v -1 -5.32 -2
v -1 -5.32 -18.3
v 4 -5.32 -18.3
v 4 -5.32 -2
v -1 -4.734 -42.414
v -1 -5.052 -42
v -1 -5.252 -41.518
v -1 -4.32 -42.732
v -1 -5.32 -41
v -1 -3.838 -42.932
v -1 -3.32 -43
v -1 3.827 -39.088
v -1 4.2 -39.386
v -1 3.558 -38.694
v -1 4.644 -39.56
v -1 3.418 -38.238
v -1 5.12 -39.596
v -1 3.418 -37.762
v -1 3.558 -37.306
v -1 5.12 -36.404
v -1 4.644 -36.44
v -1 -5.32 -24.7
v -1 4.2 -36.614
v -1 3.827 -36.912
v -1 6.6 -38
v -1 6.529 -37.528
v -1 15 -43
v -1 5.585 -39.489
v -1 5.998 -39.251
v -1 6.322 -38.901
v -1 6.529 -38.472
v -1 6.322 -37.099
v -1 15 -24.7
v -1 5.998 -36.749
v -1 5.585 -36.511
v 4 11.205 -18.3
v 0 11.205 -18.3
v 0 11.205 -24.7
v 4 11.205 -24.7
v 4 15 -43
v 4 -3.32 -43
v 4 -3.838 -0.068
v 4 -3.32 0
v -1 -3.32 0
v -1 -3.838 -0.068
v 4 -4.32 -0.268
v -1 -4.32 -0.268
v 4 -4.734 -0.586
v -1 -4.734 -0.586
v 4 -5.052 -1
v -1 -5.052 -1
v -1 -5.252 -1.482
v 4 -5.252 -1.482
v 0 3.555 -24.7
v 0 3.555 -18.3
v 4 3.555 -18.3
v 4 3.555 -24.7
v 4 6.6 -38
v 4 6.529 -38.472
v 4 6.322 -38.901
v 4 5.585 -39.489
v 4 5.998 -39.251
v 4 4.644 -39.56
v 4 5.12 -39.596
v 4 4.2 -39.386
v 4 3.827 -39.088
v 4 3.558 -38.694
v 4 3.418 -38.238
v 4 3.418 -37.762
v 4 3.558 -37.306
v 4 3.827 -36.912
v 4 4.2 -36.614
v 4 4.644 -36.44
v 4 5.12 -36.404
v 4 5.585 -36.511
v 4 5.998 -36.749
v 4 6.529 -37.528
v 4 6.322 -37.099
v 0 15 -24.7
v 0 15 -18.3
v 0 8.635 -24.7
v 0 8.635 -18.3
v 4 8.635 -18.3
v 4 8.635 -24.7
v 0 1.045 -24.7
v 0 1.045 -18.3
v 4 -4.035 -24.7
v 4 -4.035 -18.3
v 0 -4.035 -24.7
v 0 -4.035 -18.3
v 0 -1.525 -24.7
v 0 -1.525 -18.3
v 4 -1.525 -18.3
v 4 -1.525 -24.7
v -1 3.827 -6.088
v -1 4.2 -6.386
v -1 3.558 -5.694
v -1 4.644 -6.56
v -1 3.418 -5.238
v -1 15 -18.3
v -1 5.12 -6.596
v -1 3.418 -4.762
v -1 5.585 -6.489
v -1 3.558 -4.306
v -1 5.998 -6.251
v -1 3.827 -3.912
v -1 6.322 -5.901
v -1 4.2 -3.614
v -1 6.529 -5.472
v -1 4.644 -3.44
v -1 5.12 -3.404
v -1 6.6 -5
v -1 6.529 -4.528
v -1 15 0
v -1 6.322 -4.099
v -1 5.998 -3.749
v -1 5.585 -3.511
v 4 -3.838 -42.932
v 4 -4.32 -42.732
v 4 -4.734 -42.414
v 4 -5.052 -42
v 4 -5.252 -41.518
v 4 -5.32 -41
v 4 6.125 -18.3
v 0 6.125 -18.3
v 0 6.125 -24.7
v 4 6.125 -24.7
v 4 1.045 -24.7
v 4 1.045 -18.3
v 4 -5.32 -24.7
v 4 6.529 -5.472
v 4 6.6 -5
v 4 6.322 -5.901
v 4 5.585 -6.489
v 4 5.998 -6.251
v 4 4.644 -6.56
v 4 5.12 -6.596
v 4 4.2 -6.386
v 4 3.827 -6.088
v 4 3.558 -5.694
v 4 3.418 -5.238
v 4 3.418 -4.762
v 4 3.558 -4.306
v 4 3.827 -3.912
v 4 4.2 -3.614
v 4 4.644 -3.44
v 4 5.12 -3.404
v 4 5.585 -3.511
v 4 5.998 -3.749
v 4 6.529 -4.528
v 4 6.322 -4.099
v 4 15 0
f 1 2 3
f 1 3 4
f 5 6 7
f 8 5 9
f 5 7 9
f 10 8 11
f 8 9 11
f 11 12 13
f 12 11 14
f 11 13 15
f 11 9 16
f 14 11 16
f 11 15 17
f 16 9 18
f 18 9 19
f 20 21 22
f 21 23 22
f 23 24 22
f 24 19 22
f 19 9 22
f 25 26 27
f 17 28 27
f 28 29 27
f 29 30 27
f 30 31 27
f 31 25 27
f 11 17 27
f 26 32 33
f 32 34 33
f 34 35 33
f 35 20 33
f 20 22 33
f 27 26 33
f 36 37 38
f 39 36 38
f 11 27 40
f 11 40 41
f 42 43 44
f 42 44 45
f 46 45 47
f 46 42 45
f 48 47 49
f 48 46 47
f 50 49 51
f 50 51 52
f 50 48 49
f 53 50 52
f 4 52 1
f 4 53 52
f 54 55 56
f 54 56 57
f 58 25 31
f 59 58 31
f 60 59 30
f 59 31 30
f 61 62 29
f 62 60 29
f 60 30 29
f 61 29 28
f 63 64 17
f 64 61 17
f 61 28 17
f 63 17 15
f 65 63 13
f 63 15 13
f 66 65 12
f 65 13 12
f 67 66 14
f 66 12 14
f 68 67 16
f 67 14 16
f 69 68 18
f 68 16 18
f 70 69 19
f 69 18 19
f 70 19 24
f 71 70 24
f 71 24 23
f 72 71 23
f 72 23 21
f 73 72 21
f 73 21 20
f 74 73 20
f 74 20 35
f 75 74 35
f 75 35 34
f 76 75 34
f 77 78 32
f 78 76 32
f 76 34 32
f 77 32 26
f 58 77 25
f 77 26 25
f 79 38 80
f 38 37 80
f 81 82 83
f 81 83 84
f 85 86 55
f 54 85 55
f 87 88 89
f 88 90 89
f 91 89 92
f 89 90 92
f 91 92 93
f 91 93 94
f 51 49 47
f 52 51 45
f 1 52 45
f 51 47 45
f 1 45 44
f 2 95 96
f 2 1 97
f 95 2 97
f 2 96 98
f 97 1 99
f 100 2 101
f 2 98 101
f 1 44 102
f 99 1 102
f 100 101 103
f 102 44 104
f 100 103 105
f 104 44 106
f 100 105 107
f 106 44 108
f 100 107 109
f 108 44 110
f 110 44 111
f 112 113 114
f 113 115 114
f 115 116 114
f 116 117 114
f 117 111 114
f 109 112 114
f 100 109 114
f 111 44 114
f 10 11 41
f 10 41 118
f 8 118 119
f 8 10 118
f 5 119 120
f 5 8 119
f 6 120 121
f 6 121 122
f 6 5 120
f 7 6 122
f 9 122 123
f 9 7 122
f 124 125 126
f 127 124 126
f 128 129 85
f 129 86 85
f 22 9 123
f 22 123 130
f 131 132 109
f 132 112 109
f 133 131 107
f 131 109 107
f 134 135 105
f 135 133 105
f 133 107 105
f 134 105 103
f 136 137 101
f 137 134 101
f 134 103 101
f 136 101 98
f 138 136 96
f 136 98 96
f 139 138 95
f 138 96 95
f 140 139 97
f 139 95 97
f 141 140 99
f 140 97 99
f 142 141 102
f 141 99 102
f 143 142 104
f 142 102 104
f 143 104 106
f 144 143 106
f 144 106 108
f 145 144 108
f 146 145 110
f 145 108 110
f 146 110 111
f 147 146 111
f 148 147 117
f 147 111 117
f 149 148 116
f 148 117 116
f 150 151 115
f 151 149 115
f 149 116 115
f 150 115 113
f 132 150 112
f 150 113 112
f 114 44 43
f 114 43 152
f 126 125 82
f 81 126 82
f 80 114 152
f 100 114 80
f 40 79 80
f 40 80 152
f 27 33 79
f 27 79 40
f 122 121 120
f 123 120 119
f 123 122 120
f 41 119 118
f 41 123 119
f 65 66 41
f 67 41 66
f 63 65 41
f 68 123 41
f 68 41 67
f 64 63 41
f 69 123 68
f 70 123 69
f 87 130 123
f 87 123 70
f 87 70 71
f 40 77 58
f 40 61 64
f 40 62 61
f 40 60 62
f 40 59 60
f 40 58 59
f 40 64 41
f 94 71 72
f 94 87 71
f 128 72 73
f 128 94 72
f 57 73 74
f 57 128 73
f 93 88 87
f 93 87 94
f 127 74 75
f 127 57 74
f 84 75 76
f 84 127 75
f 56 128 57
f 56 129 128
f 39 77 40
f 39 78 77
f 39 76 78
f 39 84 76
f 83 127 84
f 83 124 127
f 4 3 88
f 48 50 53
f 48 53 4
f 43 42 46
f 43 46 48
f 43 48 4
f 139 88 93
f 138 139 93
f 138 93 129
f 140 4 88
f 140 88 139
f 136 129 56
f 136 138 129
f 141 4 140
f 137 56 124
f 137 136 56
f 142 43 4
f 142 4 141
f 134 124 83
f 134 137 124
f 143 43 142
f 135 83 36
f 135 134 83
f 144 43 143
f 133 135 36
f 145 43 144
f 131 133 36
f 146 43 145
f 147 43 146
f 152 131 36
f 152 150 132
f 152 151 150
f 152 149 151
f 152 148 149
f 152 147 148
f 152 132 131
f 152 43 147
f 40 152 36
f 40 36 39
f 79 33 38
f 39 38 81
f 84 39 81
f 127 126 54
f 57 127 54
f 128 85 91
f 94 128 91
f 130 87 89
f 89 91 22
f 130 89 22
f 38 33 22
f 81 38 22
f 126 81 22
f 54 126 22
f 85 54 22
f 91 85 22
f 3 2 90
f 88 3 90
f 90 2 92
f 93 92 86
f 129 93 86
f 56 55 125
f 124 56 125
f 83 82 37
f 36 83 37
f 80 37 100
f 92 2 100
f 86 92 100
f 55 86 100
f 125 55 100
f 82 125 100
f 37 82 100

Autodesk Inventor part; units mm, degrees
ref_plane "YZ Plane" through (0, 0, 0) normal (1, 0, 0) x (0, 1, 0)
ref_plane "XZ Plane" through (0, 0, 0) normal (0, 1, 0) x (-1, 0, 0)
ref_plane "XY Plane" through (0, 0, 0) normal (0, 0, 1) x (1, 0, 0)
sketch "スケッチ1" plane through (0, 0, 0) normal (1, 0, 0) x (0, 1, 0)
  line L0 (0, 0) -> (30, 0)
  line L1 (30, 0) -> (30, -43)
  line L2 (30, -43) -> (0, -43)
  line L3 (0, -43) -> (0, 0)
  circle A0 centre (15, -5) radius 1.5
  circle A1 centre (15, -38) radius 1.5
  line L4 (30, -21.5) -> (0, -21.5)
  line L5 (30, -18.3) -> (0, -18.3)
  line L6 (30, -24.7) -> (0, -24.7)
  line L7 (15, 0) -> (15, -43)
  line L8 (16.285, -18.3) -> (16.285, -24.7)
  line L9 (13.715, -18.3) -> (13.715, -24.7)
  line L10 (20.08, -18.3) -> (20.08, -24.7)
  line L11 (25.16, -18.3) -> (25.16, -24.7)
  line L12 (30.24, -18.3) -> (30.24, -24.7)
  line L13 (21.365, -18.3) -> (21.365, -24.7)
  line L14 (26.445, -18.3) -> (26.445, -24.7)
  line L15 (28.955, -18.3) -> (28.955, -24.7)
  line L16 (23.875, -18.3) -> (23.875, -24.7)
  line L17 (18.795, -18.3) -> (18.795, -24.7)
  line L18 (8.635, -18.3) -> (8.635, -24.7)
  line L19 (3.555, -18.3) -> (3.555, -24.7)
  line L20 (1.045, -18.3) -> (1.045, -24.7)
  line L21 (6.125, -18.3) -> (6.125, -24.7)
  line L22 (11.205, -18.3) -> (11.205, -24.7)
  circle A2 centre (5, -5) radius 1.6
  circle A3 centre (22.5, -5) radius 1.7
  circle A4 centre (22.5, -38) radius 1.7
  circle A5 centre (5, -38) radius 1.6
  line L23 (1.045, -18.3) -> (1.045, -24.7)
  line L24 (-1.525, -18.3) -> (-1.525, -24.7)
  line L25 (-4.035, -18.3) -> (-4.035, -24.7)
  line L26 (-6.605, -18.3) -> (-6.605, -24.7)
  line L27 (-6.605, -18.3) -> (-4.035, -18.3)
  line L28 (-5.32, -18.3) -> (-5.32, 0.2949)
  line L29 (-5.32, 0) -> (0, 0)
  line L30 (0, 0) -> (0, -43)
  line L31 (0, -43) -> (-5.32, -43)
  line L32 (-5.32, -43) -> (-5.32, 0)
  line L33 (0, -18.3) -> (-5.32, -18.3)
  line L34 (0, -24.7) -> (-5.32, -24.7)
  point P0 (15, -24.7)
  point P1 (15, -18.3)
  dimension "d0" = 30
  dimension "d1" = 43
  dimension "d2" = 3
  dimension "d3" = 3
  dimension "d4" = 5
  dimension "d5" = 5
  dimension "d6" = 15
  dimension "d7" = 15
  dimension "d8" = 3.2
  dimension "d9" = 3.2
  dimension "d10" = 1.285
  dimension "d11" = 1.285
  dimension "d12" = 5.08
  dimension "d13" = 5.08
  dimension "d14" = 5.08
  dimension "d15" = 1.285
  dimension "d16" = 1.285
  dimension "d17" = 1.285
  dimension "d21" = 3.2
  dimension "d22" = 3.4
  dimension "d23" = 3.4
  dimension "d24" = 3.2
  dimension "d25" = 5
  dimension "d26" = 5
  dimension "d28" = 7.5
  dimension "d30" = 5
  dimension "d31" = 7.5
  dimension "d32" = 5
  dimension "d38" = 5.08
  dimension "d43" = 0
  dimension "d44" = 10
  dimension "d45" = 10
extrude "押し出し1" add sketch "スケッチ1" along normal blind 4 contours L0 L7 A0 L5 L3 | L3 L33 L27 L28 L29 | L7 A0 | L5 L19 L4 L20 | L24 L34 L25 L33 | L6 L7 A1 L2 L3 | L3 L31 L32 L34 | L4 L19 L6 L20 | L7 L4 L9 L5 | L5 L18 L4 L21 | L9 L4 L22 L5 | L7 L6 L9 L4 | L4 L18 L6 L21 | L9 L6 L22 L4 | A1 L7 picked at (14.3164, -4.583) picked at (14.3492, -38.284)
sketch "スケッチ2" plane through (4, 0, 0) normal (1, 0, 0) x (0, 0, -1)
  line L0 (18.3, 1.045) -> (24.7, 1.045) projected
  line L1 (18.3, 3.555) -> (18.3, 6.125) projected
  line L2 (18.3, 6.125) -> (24.7, 6.125) projected
  line L3 (24.7, 6.125) -> (24.7, 3.555) projected
  line L4 (24.7, 3.555) -> (18.3, 3.555) projected
  line L5 (18.3, 11.205) -> (24.7, 11.205) projected
  line L6 (24.7, 11.205) -> (24.7, 8.635) projected
  line L7 (24.7, 8.635) -> (18.3, 8.635) projected
  line L8 (18.3, 8.635) -> (18.3, 11.205) projected
  line L9 (43, 15) -> (0, 15) projected
  line L10 (0, 15) -> (0, -5.32) projected
  line L11 (0, -5.32) -> (18.3, -5.32) projected
  line L12 (18.3, -5.32) -> (18.3, -4.035) projected
  line L13 (18.3, -4.035) -> (24.7, -4.035) projected
  line L14 (24.7, -4.035) -> (24.7, -5.32) projected
  line L15 (24.7, -5.32) -> (43, -5.32) projected
  line L16 (43, -5.32) -> (43, 15) projected
  line L17 (18.3, -1.525) -> (18.3, 1.045) projected
  line L18 (24.7, 1.045) -> (24.7, -1.525) projected
  line L19 (24.7, -1.525) -> (18.3, -1.525) projected
  point P0 (0, 0)
extrude "押し出し2" add sketch "スケッチ1" against normal blind 1 contours L0 L7 A0 L5 L3 | L3 L33 L27 L28 L29 | L7 A0 | L6 L7 A1 L2 L3 | L3 L31 L32 L34 | A1 L7 picked at (14.3164, -4.583) picked at (14.3492, -38.284)
fillet "フィレット3" radius 2 2 edges at (1.5, -5.32, 0) (1.5, -5.32, -43)
equation "\"d24\" = d21"
equation "\"d45\" = d44"
properties part number "RZvector-v1-Plate-B-F" material "ABS プラスチック"
